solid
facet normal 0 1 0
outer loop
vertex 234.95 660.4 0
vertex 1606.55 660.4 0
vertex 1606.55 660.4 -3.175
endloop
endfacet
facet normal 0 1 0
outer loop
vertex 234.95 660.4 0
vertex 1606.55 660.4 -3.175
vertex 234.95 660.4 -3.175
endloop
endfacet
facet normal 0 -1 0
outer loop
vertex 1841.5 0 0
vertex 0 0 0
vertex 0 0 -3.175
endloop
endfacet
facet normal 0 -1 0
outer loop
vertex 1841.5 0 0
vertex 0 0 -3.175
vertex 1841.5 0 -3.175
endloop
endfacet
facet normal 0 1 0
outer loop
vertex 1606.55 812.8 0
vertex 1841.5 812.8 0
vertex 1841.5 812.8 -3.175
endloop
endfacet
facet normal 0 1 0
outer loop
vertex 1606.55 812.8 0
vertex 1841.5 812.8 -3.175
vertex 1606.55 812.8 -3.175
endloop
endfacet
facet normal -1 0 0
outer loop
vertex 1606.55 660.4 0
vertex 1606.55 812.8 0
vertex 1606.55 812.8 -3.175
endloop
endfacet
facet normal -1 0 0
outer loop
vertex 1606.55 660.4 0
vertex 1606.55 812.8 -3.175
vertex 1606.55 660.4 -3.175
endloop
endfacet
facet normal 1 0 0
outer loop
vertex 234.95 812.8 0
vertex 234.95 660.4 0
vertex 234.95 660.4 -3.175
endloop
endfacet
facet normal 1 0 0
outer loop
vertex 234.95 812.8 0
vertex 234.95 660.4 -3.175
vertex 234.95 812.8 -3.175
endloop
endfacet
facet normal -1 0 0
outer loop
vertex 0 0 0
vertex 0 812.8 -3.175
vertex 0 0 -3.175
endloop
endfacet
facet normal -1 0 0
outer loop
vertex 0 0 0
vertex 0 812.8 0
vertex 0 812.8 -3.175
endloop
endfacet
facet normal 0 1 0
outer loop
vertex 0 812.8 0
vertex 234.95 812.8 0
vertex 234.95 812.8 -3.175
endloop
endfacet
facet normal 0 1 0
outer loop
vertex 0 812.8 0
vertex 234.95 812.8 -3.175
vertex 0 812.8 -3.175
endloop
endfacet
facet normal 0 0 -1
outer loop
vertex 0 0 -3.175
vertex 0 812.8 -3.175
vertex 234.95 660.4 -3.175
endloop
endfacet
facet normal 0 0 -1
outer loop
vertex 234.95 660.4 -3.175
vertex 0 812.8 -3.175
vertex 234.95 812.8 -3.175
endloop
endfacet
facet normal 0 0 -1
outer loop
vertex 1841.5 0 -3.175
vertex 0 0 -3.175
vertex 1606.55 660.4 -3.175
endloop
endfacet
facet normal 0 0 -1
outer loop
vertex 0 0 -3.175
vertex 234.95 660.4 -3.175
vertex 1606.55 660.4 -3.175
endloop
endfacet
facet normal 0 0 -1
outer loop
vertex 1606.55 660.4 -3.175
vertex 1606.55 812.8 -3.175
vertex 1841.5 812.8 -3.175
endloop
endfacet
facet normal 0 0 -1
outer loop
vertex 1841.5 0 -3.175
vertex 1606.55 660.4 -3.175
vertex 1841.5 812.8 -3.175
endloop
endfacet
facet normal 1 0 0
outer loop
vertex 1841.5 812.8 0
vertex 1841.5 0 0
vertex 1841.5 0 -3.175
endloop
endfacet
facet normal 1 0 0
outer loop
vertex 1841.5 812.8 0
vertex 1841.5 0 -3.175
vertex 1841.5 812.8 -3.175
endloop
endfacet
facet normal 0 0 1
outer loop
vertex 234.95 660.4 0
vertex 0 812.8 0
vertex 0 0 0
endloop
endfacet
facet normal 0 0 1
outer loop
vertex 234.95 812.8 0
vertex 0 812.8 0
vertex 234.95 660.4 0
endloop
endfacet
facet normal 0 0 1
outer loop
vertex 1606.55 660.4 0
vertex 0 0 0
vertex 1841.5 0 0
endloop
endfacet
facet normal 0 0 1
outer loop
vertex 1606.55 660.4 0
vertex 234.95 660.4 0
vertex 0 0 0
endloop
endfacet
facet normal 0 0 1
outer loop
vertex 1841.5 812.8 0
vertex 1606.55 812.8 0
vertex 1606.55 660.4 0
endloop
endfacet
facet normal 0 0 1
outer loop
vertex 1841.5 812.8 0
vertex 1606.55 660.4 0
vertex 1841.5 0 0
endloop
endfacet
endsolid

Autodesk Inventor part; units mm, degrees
ref_plane "YZ Plane" through (0, 0, 0) normal (1, 0, 0) x (0, 1, 0)
ref_plane "XZ Plane" through (0, 0, 0) normal (0, 1, 0) x (-1, 0, 0)
ref_plane "XY Plane" through (0, 0, 0) normal (0, 0, 1) x (1, 0, 0)
sketch "Sketch1" plane through (0, 0, 0) normal (0, 0, 1) x (1, 0, 0)
  line L0 (0, 0) -> (1841.5, 0)
  line L1 (1841.5, 0) -> (1841.5, 812.8)
  line L2 (1841.5, 812.8) -> (1606.55, 812.8)
  line L3 (1606.55, 812.8) -> (1606.55, 660.4)
  line L4 (1606.55, 660.4) -> (234.95, 660.4)
  line L5 (234.95, 660.4) -> (234.95, 812.8)
  line L6 (234.95, 812.8) -> (0, 812.8)
  line L7 (0, 812.8) -> (0, 0)
  dimension "d0" = 1841.5
  dimension "d1" = 812.8
  dimension "d2" = 234.95
  dimension "d3" = 152.4
  dimension "d4" = 234.95
  dimension "d5" = 152.4
extrude "Extrusion1" add sketch "Sketch1" against normal blind 3.175
equation "\"d4\" = d2"
equation "\"d5\" = d3"
properties part number "GE-13013B" material "Polycarbonate, Clear"
